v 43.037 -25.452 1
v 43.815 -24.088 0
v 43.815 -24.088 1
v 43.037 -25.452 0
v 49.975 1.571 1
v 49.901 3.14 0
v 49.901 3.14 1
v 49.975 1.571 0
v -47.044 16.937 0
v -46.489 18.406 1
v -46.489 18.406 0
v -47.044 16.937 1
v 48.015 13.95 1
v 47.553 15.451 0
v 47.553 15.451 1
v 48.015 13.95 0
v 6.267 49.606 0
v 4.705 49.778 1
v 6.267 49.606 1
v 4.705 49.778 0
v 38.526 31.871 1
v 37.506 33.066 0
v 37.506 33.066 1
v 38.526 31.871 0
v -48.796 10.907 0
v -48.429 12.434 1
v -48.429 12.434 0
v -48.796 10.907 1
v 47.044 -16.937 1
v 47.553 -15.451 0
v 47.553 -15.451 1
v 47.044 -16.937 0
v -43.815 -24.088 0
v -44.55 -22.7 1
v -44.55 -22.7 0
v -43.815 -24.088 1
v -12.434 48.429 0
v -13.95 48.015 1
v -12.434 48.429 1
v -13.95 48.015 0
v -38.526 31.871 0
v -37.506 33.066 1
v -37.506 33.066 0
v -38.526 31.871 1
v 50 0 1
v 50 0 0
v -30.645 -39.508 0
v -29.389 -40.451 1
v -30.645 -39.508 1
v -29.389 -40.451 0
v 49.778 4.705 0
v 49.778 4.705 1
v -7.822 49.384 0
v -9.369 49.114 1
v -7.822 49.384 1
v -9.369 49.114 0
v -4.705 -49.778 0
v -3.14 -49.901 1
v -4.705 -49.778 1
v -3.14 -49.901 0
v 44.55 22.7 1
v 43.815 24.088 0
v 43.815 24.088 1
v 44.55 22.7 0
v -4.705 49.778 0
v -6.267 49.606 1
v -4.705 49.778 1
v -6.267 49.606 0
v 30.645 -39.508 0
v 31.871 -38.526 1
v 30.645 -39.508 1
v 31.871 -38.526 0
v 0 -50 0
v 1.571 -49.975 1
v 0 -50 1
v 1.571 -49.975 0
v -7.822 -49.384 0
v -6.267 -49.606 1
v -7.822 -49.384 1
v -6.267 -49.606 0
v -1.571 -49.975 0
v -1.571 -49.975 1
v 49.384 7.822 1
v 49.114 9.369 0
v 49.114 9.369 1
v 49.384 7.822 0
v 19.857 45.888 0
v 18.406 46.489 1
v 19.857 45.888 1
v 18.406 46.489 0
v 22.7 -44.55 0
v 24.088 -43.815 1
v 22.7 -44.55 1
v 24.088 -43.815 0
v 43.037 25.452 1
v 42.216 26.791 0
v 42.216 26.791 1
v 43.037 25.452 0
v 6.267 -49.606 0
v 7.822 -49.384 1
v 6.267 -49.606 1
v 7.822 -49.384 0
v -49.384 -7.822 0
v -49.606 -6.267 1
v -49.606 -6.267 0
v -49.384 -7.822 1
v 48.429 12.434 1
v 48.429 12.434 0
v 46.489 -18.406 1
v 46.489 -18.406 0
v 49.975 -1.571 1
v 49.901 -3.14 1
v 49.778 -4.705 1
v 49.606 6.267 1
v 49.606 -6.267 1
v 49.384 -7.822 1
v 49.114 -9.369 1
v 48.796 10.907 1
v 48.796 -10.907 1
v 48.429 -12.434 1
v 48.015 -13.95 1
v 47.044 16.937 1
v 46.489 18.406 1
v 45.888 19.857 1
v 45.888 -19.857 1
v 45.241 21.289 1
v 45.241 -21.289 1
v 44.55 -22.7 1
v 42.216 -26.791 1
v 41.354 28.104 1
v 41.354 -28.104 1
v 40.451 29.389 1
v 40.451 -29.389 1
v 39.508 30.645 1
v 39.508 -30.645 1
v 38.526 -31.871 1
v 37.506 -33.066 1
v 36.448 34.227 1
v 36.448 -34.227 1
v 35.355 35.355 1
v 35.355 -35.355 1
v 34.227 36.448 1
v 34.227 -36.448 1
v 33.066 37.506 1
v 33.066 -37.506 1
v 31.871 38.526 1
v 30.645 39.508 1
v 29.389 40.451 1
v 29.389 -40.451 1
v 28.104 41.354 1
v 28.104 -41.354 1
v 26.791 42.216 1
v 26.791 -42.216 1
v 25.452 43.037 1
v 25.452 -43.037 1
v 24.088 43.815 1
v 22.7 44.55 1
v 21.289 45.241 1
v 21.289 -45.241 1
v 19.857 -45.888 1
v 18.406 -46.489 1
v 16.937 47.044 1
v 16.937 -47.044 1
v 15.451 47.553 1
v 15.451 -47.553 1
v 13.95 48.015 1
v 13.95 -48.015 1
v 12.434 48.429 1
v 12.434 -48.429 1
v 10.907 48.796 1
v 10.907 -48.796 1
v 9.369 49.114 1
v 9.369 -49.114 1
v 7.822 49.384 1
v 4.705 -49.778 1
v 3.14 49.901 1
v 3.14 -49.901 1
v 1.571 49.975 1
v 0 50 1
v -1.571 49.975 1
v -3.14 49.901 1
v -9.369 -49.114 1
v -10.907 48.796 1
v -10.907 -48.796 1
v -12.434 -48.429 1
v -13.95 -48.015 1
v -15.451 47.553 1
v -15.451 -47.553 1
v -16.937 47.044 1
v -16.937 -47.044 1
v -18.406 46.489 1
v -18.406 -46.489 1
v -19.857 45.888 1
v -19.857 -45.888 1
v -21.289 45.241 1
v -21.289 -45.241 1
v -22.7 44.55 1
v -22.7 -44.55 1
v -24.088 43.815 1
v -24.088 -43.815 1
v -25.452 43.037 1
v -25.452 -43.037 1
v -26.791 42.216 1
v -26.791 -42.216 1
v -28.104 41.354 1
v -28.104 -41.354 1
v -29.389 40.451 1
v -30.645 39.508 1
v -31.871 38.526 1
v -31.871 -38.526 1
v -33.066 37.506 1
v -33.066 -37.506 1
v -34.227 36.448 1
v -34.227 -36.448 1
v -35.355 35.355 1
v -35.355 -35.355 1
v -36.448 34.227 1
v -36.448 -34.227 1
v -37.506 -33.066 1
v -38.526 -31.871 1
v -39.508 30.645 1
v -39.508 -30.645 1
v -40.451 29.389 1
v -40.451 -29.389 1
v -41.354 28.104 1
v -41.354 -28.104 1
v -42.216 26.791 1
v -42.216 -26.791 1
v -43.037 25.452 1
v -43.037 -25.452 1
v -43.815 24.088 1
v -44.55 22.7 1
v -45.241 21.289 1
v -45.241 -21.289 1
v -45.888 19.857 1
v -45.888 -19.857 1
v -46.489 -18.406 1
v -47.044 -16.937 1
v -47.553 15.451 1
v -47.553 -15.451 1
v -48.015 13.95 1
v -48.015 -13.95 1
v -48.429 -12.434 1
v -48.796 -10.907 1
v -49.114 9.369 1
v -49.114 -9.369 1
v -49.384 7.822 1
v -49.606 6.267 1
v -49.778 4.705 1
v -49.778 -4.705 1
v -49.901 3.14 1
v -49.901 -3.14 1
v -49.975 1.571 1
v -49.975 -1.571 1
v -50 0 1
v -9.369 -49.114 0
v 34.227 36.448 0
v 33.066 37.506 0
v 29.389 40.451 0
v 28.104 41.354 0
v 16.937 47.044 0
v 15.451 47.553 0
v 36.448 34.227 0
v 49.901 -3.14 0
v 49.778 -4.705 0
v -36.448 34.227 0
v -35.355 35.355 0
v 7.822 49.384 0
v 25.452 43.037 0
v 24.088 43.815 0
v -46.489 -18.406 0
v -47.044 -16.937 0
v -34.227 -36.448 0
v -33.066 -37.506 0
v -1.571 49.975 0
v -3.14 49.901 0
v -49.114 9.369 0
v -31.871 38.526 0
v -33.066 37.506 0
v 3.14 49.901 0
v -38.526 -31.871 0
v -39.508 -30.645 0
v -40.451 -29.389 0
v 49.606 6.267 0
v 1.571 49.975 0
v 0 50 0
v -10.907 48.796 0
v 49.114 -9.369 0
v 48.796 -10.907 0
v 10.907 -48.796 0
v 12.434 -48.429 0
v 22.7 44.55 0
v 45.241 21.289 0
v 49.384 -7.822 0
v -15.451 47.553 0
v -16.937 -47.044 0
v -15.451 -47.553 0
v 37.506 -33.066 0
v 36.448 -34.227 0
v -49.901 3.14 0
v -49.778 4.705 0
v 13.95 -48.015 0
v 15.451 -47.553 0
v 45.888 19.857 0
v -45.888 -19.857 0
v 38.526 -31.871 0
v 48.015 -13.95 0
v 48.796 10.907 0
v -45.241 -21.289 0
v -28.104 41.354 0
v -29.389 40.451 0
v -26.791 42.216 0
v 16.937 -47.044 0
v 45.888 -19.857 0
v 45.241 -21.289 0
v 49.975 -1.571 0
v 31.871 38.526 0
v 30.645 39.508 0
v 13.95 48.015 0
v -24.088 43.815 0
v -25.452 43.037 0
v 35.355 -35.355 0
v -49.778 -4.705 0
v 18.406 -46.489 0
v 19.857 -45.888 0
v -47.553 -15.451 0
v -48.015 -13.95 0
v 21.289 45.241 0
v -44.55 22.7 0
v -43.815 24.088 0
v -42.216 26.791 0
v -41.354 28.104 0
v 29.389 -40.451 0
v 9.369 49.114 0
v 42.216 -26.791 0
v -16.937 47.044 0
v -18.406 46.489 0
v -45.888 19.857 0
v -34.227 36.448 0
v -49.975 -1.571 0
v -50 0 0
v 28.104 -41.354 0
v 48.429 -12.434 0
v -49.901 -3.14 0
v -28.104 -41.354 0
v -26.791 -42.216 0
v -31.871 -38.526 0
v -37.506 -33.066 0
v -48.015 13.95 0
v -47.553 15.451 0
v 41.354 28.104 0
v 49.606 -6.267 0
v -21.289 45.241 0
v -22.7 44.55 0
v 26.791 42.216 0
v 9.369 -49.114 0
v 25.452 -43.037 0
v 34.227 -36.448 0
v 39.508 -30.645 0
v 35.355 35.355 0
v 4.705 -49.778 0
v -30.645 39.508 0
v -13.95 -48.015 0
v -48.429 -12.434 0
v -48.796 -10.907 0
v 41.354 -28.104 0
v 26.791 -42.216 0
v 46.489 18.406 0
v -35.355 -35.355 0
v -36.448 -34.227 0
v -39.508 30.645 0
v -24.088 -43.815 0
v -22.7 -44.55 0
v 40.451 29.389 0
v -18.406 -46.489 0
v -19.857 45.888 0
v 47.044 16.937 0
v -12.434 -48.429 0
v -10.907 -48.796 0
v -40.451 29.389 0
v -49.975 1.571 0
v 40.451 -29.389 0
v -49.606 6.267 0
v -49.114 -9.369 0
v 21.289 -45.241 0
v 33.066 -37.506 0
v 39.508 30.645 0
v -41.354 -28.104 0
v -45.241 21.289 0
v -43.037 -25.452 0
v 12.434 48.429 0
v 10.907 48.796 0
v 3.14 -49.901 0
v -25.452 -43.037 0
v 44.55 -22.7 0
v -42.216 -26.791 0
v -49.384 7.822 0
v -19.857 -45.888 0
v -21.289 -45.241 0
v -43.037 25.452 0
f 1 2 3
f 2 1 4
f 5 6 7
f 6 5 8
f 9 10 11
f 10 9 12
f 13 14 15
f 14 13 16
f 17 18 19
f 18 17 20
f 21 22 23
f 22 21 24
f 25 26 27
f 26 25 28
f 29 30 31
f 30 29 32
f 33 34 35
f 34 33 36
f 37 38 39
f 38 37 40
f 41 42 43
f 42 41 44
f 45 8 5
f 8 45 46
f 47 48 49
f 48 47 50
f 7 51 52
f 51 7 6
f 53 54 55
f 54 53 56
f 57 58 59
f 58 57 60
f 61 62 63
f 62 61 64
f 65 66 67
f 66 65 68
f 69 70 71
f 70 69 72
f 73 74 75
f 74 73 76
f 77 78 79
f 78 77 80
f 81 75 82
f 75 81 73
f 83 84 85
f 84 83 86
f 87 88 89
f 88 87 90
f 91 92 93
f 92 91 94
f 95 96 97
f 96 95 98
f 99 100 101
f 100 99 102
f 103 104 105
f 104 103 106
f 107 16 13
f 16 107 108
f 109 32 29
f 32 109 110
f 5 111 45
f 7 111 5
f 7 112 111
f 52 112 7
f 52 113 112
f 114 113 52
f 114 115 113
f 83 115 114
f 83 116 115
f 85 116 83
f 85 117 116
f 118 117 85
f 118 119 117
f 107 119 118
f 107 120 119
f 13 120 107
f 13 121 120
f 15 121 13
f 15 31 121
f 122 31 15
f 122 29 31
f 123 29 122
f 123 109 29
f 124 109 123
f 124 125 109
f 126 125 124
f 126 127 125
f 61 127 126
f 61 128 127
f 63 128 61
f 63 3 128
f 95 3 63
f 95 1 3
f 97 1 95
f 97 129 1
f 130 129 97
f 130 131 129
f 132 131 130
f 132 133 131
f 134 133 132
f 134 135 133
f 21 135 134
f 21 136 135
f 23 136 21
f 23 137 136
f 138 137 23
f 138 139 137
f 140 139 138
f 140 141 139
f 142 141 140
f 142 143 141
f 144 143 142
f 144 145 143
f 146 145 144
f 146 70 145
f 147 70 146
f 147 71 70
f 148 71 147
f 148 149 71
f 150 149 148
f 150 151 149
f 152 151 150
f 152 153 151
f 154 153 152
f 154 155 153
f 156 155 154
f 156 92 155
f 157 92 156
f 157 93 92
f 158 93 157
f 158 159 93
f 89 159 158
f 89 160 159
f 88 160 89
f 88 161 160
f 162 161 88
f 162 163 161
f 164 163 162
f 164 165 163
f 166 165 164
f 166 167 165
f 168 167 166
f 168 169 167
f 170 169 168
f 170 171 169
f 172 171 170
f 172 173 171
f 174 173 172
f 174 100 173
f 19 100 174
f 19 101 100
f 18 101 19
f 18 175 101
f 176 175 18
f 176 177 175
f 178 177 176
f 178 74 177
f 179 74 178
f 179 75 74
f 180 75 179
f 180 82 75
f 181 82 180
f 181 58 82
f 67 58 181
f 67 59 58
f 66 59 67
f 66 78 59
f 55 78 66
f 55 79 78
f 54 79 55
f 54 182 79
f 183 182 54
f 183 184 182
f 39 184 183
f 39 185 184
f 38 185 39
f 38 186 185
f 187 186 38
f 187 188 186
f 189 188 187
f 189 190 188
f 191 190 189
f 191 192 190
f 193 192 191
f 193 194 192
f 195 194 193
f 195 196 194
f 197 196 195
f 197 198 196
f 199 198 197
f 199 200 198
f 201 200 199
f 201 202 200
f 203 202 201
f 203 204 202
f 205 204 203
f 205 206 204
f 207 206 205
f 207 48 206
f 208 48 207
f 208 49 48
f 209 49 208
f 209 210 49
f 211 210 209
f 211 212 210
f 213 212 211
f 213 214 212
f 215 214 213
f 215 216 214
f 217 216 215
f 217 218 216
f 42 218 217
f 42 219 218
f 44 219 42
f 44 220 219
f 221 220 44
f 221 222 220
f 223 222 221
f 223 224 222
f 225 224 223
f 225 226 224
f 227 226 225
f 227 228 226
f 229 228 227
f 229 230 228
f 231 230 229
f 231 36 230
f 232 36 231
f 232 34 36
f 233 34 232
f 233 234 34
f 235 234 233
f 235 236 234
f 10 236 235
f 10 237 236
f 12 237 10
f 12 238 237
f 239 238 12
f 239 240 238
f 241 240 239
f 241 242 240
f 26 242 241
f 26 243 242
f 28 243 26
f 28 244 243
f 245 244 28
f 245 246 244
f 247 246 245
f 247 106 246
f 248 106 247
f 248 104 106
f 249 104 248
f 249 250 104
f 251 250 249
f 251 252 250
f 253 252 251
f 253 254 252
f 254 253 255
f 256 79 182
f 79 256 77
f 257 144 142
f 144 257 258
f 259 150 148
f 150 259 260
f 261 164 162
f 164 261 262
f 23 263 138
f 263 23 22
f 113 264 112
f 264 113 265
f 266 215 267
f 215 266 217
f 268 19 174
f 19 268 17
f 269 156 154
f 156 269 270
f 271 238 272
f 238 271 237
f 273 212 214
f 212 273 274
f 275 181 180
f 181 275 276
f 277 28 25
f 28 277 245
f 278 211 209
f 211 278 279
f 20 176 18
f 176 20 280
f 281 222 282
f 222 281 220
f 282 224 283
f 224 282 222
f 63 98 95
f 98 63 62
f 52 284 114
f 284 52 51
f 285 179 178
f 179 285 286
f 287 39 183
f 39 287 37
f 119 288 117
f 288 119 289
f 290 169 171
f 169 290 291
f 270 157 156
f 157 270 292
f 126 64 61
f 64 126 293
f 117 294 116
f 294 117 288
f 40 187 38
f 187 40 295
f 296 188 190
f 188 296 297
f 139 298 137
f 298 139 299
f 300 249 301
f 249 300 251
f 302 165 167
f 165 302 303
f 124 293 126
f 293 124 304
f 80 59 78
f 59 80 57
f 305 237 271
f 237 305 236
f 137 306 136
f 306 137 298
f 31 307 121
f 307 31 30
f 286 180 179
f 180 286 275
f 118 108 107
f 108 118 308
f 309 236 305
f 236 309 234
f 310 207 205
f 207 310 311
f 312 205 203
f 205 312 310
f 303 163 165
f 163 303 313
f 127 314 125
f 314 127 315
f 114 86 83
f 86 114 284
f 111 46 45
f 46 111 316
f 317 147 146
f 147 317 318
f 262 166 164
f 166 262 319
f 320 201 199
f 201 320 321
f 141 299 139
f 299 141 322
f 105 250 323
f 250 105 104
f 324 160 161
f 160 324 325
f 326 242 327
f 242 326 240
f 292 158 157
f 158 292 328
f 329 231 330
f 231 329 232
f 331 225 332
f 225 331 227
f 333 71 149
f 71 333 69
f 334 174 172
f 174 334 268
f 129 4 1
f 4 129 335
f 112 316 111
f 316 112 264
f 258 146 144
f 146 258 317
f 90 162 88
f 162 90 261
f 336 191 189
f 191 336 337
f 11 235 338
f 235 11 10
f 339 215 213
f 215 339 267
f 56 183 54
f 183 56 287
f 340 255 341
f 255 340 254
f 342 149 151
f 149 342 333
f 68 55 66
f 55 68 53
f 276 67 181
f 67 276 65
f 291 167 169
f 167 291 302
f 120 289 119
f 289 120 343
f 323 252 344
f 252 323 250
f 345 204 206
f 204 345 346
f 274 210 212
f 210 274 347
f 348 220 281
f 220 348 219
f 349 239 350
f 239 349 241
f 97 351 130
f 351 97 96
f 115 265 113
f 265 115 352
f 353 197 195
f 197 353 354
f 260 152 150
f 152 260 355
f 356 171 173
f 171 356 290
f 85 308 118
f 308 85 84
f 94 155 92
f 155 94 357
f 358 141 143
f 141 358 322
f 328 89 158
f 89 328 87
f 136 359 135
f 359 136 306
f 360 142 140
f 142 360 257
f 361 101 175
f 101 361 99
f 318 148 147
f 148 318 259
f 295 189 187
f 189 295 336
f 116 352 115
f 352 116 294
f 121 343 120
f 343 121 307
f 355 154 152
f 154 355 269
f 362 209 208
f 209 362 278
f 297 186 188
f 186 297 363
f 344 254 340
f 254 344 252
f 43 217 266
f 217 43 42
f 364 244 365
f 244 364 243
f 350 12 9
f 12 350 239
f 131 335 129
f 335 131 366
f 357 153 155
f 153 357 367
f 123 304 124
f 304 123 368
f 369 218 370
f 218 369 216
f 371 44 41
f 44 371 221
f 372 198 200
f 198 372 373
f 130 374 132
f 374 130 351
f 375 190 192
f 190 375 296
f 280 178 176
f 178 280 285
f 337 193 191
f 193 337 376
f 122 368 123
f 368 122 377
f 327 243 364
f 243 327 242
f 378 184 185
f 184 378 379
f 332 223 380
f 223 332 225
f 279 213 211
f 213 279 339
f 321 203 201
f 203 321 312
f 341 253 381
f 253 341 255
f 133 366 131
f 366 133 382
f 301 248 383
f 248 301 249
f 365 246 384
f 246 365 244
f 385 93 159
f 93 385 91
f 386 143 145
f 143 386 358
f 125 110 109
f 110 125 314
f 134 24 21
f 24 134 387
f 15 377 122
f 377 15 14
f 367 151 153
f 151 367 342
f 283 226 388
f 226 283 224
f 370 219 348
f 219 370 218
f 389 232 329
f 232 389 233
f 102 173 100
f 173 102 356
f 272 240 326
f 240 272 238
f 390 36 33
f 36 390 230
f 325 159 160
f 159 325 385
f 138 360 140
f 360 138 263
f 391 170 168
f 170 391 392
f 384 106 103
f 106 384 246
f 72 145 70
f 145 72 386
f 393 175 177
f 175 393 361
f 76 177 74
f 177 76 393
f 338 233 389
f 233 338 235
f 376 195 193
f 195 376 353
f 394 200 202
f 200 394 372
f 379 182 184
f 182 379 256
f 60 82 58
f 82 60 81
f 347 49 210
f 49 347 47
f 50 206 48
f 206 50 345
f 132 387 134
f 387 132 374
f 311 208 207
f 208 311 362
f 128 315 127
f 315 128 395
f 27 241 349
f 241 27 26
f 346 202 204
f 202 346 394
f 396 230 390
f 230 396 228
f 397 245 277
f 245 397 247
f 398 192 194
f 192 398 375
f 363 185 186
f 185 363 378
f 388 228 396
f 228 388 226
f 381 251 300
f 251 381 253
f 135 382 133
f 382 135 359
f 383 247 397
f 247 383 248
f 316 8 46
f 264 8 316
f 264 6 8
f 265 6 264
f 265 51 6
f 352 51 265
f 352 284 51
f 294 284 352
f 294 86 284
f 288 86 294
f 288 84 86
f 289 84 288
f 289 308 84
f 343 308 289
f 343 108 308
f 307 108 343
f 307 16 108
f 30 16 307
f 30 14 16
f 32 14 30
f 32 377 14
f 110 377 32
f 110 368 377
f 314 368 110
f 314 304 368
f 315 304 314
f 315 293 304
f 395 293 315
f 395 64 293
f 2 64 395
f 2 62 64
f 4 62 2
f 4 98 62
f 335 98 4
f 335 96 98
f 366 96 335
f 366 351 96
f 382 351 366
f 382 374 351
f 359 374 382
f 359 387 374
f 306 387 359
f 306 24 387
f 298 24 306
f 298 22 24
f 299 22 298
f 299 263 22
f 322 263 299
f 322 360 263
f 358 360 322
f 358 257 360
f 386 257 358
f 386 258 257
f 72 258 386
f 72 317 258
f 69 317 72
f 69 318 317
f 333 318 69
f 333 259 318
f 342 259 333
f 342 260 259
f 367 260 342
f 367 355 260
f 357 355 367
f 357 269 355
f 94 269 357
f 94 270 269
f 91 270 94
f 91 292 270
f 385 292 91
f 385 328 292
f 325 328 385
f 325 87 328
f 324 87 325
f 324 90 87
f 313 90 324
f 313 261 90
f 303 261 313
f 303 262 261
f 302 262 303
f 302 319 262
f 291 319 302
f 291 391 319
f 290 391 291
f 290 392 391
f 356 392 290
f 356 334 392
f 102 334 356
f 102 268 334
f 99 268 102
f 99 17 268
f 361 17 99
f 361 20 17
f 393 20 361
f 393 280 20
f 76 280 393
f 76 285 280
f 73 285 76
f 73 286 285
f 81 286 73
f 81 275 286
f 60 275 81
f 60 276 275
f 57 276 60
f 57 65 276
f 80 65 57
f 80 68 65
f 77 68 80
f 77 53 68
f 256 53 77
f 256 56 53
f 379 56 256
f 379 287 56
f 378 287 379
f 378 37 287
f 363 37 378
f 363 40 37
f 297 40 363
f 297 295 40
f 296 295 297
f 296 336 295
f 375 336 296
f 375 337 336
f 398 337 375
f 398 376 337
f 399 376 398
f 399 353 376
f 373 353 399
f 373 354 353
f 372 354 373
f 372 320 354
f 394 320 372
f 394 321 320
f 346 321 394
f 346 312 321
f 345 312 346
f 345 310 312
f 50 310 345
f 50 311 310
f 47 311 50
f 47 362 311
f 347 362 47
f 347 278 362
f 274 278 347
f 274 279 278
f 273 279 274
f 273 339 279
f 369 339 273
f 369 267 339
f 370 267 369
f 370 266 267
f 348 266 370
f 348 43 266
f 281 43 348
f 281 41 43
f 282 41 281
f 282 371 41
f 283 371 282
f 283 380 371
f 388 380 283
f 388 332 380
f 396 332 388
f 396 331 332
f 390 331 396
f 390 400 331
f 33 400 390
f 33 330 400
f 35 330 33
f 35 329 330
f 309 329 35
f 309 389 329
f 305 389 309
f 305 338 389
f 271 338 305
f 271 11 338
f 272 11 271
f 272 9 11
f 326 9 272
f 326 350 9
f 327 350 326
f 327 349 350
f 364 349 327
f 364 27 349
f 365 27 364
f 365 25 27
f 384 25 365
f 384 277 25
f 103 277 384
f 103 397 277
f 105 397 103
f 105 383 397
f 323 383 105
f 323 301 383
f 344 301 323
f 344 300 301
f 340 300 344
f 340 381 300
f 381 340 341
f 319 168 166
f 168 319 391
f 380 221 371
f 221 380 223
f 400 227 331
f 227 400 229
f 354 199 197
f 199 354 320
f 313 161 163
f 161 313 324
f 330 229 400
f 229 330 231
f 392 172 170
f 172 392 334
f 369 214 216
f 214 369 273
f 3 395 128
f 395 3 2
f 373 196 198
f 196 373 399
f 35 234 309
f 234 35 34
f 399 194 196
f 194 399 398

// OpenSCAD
//
// Coffee Cococa Screen
// Copyright (C) 2022 Nils Weber
//
// Licensed under CC BY-NC-SA 4.0
//

////////////////////////////////////////////////////////////////////////////////

/* [Screen] */

// Diameter of the entire screen (should be at least the diameter of your cup)
Screen_Diameter = 100;

// Thickness of the Screen
Thickness = 1;


/* [Design] */

// Diameter of the design printed on the screen
Design_Diameter = 50;

// Path to the design SVG
Design_Path = "";

////////////////////////////////////////////////////////////////////////////////

/* [Hidden] */
$fn = Screen_Diameter * 2;

module base() {
	cylinder(d=Screen_Diameter);
}

module design() {
	t = Thickness + 1;

	resize([Design_Diameter, 0, t], auto=true)
	translate([0, 0, -0.5])
	linear_extrude(t)
	import(Design_Path, center=true);
}

difference() {
	base();
	design();
}
